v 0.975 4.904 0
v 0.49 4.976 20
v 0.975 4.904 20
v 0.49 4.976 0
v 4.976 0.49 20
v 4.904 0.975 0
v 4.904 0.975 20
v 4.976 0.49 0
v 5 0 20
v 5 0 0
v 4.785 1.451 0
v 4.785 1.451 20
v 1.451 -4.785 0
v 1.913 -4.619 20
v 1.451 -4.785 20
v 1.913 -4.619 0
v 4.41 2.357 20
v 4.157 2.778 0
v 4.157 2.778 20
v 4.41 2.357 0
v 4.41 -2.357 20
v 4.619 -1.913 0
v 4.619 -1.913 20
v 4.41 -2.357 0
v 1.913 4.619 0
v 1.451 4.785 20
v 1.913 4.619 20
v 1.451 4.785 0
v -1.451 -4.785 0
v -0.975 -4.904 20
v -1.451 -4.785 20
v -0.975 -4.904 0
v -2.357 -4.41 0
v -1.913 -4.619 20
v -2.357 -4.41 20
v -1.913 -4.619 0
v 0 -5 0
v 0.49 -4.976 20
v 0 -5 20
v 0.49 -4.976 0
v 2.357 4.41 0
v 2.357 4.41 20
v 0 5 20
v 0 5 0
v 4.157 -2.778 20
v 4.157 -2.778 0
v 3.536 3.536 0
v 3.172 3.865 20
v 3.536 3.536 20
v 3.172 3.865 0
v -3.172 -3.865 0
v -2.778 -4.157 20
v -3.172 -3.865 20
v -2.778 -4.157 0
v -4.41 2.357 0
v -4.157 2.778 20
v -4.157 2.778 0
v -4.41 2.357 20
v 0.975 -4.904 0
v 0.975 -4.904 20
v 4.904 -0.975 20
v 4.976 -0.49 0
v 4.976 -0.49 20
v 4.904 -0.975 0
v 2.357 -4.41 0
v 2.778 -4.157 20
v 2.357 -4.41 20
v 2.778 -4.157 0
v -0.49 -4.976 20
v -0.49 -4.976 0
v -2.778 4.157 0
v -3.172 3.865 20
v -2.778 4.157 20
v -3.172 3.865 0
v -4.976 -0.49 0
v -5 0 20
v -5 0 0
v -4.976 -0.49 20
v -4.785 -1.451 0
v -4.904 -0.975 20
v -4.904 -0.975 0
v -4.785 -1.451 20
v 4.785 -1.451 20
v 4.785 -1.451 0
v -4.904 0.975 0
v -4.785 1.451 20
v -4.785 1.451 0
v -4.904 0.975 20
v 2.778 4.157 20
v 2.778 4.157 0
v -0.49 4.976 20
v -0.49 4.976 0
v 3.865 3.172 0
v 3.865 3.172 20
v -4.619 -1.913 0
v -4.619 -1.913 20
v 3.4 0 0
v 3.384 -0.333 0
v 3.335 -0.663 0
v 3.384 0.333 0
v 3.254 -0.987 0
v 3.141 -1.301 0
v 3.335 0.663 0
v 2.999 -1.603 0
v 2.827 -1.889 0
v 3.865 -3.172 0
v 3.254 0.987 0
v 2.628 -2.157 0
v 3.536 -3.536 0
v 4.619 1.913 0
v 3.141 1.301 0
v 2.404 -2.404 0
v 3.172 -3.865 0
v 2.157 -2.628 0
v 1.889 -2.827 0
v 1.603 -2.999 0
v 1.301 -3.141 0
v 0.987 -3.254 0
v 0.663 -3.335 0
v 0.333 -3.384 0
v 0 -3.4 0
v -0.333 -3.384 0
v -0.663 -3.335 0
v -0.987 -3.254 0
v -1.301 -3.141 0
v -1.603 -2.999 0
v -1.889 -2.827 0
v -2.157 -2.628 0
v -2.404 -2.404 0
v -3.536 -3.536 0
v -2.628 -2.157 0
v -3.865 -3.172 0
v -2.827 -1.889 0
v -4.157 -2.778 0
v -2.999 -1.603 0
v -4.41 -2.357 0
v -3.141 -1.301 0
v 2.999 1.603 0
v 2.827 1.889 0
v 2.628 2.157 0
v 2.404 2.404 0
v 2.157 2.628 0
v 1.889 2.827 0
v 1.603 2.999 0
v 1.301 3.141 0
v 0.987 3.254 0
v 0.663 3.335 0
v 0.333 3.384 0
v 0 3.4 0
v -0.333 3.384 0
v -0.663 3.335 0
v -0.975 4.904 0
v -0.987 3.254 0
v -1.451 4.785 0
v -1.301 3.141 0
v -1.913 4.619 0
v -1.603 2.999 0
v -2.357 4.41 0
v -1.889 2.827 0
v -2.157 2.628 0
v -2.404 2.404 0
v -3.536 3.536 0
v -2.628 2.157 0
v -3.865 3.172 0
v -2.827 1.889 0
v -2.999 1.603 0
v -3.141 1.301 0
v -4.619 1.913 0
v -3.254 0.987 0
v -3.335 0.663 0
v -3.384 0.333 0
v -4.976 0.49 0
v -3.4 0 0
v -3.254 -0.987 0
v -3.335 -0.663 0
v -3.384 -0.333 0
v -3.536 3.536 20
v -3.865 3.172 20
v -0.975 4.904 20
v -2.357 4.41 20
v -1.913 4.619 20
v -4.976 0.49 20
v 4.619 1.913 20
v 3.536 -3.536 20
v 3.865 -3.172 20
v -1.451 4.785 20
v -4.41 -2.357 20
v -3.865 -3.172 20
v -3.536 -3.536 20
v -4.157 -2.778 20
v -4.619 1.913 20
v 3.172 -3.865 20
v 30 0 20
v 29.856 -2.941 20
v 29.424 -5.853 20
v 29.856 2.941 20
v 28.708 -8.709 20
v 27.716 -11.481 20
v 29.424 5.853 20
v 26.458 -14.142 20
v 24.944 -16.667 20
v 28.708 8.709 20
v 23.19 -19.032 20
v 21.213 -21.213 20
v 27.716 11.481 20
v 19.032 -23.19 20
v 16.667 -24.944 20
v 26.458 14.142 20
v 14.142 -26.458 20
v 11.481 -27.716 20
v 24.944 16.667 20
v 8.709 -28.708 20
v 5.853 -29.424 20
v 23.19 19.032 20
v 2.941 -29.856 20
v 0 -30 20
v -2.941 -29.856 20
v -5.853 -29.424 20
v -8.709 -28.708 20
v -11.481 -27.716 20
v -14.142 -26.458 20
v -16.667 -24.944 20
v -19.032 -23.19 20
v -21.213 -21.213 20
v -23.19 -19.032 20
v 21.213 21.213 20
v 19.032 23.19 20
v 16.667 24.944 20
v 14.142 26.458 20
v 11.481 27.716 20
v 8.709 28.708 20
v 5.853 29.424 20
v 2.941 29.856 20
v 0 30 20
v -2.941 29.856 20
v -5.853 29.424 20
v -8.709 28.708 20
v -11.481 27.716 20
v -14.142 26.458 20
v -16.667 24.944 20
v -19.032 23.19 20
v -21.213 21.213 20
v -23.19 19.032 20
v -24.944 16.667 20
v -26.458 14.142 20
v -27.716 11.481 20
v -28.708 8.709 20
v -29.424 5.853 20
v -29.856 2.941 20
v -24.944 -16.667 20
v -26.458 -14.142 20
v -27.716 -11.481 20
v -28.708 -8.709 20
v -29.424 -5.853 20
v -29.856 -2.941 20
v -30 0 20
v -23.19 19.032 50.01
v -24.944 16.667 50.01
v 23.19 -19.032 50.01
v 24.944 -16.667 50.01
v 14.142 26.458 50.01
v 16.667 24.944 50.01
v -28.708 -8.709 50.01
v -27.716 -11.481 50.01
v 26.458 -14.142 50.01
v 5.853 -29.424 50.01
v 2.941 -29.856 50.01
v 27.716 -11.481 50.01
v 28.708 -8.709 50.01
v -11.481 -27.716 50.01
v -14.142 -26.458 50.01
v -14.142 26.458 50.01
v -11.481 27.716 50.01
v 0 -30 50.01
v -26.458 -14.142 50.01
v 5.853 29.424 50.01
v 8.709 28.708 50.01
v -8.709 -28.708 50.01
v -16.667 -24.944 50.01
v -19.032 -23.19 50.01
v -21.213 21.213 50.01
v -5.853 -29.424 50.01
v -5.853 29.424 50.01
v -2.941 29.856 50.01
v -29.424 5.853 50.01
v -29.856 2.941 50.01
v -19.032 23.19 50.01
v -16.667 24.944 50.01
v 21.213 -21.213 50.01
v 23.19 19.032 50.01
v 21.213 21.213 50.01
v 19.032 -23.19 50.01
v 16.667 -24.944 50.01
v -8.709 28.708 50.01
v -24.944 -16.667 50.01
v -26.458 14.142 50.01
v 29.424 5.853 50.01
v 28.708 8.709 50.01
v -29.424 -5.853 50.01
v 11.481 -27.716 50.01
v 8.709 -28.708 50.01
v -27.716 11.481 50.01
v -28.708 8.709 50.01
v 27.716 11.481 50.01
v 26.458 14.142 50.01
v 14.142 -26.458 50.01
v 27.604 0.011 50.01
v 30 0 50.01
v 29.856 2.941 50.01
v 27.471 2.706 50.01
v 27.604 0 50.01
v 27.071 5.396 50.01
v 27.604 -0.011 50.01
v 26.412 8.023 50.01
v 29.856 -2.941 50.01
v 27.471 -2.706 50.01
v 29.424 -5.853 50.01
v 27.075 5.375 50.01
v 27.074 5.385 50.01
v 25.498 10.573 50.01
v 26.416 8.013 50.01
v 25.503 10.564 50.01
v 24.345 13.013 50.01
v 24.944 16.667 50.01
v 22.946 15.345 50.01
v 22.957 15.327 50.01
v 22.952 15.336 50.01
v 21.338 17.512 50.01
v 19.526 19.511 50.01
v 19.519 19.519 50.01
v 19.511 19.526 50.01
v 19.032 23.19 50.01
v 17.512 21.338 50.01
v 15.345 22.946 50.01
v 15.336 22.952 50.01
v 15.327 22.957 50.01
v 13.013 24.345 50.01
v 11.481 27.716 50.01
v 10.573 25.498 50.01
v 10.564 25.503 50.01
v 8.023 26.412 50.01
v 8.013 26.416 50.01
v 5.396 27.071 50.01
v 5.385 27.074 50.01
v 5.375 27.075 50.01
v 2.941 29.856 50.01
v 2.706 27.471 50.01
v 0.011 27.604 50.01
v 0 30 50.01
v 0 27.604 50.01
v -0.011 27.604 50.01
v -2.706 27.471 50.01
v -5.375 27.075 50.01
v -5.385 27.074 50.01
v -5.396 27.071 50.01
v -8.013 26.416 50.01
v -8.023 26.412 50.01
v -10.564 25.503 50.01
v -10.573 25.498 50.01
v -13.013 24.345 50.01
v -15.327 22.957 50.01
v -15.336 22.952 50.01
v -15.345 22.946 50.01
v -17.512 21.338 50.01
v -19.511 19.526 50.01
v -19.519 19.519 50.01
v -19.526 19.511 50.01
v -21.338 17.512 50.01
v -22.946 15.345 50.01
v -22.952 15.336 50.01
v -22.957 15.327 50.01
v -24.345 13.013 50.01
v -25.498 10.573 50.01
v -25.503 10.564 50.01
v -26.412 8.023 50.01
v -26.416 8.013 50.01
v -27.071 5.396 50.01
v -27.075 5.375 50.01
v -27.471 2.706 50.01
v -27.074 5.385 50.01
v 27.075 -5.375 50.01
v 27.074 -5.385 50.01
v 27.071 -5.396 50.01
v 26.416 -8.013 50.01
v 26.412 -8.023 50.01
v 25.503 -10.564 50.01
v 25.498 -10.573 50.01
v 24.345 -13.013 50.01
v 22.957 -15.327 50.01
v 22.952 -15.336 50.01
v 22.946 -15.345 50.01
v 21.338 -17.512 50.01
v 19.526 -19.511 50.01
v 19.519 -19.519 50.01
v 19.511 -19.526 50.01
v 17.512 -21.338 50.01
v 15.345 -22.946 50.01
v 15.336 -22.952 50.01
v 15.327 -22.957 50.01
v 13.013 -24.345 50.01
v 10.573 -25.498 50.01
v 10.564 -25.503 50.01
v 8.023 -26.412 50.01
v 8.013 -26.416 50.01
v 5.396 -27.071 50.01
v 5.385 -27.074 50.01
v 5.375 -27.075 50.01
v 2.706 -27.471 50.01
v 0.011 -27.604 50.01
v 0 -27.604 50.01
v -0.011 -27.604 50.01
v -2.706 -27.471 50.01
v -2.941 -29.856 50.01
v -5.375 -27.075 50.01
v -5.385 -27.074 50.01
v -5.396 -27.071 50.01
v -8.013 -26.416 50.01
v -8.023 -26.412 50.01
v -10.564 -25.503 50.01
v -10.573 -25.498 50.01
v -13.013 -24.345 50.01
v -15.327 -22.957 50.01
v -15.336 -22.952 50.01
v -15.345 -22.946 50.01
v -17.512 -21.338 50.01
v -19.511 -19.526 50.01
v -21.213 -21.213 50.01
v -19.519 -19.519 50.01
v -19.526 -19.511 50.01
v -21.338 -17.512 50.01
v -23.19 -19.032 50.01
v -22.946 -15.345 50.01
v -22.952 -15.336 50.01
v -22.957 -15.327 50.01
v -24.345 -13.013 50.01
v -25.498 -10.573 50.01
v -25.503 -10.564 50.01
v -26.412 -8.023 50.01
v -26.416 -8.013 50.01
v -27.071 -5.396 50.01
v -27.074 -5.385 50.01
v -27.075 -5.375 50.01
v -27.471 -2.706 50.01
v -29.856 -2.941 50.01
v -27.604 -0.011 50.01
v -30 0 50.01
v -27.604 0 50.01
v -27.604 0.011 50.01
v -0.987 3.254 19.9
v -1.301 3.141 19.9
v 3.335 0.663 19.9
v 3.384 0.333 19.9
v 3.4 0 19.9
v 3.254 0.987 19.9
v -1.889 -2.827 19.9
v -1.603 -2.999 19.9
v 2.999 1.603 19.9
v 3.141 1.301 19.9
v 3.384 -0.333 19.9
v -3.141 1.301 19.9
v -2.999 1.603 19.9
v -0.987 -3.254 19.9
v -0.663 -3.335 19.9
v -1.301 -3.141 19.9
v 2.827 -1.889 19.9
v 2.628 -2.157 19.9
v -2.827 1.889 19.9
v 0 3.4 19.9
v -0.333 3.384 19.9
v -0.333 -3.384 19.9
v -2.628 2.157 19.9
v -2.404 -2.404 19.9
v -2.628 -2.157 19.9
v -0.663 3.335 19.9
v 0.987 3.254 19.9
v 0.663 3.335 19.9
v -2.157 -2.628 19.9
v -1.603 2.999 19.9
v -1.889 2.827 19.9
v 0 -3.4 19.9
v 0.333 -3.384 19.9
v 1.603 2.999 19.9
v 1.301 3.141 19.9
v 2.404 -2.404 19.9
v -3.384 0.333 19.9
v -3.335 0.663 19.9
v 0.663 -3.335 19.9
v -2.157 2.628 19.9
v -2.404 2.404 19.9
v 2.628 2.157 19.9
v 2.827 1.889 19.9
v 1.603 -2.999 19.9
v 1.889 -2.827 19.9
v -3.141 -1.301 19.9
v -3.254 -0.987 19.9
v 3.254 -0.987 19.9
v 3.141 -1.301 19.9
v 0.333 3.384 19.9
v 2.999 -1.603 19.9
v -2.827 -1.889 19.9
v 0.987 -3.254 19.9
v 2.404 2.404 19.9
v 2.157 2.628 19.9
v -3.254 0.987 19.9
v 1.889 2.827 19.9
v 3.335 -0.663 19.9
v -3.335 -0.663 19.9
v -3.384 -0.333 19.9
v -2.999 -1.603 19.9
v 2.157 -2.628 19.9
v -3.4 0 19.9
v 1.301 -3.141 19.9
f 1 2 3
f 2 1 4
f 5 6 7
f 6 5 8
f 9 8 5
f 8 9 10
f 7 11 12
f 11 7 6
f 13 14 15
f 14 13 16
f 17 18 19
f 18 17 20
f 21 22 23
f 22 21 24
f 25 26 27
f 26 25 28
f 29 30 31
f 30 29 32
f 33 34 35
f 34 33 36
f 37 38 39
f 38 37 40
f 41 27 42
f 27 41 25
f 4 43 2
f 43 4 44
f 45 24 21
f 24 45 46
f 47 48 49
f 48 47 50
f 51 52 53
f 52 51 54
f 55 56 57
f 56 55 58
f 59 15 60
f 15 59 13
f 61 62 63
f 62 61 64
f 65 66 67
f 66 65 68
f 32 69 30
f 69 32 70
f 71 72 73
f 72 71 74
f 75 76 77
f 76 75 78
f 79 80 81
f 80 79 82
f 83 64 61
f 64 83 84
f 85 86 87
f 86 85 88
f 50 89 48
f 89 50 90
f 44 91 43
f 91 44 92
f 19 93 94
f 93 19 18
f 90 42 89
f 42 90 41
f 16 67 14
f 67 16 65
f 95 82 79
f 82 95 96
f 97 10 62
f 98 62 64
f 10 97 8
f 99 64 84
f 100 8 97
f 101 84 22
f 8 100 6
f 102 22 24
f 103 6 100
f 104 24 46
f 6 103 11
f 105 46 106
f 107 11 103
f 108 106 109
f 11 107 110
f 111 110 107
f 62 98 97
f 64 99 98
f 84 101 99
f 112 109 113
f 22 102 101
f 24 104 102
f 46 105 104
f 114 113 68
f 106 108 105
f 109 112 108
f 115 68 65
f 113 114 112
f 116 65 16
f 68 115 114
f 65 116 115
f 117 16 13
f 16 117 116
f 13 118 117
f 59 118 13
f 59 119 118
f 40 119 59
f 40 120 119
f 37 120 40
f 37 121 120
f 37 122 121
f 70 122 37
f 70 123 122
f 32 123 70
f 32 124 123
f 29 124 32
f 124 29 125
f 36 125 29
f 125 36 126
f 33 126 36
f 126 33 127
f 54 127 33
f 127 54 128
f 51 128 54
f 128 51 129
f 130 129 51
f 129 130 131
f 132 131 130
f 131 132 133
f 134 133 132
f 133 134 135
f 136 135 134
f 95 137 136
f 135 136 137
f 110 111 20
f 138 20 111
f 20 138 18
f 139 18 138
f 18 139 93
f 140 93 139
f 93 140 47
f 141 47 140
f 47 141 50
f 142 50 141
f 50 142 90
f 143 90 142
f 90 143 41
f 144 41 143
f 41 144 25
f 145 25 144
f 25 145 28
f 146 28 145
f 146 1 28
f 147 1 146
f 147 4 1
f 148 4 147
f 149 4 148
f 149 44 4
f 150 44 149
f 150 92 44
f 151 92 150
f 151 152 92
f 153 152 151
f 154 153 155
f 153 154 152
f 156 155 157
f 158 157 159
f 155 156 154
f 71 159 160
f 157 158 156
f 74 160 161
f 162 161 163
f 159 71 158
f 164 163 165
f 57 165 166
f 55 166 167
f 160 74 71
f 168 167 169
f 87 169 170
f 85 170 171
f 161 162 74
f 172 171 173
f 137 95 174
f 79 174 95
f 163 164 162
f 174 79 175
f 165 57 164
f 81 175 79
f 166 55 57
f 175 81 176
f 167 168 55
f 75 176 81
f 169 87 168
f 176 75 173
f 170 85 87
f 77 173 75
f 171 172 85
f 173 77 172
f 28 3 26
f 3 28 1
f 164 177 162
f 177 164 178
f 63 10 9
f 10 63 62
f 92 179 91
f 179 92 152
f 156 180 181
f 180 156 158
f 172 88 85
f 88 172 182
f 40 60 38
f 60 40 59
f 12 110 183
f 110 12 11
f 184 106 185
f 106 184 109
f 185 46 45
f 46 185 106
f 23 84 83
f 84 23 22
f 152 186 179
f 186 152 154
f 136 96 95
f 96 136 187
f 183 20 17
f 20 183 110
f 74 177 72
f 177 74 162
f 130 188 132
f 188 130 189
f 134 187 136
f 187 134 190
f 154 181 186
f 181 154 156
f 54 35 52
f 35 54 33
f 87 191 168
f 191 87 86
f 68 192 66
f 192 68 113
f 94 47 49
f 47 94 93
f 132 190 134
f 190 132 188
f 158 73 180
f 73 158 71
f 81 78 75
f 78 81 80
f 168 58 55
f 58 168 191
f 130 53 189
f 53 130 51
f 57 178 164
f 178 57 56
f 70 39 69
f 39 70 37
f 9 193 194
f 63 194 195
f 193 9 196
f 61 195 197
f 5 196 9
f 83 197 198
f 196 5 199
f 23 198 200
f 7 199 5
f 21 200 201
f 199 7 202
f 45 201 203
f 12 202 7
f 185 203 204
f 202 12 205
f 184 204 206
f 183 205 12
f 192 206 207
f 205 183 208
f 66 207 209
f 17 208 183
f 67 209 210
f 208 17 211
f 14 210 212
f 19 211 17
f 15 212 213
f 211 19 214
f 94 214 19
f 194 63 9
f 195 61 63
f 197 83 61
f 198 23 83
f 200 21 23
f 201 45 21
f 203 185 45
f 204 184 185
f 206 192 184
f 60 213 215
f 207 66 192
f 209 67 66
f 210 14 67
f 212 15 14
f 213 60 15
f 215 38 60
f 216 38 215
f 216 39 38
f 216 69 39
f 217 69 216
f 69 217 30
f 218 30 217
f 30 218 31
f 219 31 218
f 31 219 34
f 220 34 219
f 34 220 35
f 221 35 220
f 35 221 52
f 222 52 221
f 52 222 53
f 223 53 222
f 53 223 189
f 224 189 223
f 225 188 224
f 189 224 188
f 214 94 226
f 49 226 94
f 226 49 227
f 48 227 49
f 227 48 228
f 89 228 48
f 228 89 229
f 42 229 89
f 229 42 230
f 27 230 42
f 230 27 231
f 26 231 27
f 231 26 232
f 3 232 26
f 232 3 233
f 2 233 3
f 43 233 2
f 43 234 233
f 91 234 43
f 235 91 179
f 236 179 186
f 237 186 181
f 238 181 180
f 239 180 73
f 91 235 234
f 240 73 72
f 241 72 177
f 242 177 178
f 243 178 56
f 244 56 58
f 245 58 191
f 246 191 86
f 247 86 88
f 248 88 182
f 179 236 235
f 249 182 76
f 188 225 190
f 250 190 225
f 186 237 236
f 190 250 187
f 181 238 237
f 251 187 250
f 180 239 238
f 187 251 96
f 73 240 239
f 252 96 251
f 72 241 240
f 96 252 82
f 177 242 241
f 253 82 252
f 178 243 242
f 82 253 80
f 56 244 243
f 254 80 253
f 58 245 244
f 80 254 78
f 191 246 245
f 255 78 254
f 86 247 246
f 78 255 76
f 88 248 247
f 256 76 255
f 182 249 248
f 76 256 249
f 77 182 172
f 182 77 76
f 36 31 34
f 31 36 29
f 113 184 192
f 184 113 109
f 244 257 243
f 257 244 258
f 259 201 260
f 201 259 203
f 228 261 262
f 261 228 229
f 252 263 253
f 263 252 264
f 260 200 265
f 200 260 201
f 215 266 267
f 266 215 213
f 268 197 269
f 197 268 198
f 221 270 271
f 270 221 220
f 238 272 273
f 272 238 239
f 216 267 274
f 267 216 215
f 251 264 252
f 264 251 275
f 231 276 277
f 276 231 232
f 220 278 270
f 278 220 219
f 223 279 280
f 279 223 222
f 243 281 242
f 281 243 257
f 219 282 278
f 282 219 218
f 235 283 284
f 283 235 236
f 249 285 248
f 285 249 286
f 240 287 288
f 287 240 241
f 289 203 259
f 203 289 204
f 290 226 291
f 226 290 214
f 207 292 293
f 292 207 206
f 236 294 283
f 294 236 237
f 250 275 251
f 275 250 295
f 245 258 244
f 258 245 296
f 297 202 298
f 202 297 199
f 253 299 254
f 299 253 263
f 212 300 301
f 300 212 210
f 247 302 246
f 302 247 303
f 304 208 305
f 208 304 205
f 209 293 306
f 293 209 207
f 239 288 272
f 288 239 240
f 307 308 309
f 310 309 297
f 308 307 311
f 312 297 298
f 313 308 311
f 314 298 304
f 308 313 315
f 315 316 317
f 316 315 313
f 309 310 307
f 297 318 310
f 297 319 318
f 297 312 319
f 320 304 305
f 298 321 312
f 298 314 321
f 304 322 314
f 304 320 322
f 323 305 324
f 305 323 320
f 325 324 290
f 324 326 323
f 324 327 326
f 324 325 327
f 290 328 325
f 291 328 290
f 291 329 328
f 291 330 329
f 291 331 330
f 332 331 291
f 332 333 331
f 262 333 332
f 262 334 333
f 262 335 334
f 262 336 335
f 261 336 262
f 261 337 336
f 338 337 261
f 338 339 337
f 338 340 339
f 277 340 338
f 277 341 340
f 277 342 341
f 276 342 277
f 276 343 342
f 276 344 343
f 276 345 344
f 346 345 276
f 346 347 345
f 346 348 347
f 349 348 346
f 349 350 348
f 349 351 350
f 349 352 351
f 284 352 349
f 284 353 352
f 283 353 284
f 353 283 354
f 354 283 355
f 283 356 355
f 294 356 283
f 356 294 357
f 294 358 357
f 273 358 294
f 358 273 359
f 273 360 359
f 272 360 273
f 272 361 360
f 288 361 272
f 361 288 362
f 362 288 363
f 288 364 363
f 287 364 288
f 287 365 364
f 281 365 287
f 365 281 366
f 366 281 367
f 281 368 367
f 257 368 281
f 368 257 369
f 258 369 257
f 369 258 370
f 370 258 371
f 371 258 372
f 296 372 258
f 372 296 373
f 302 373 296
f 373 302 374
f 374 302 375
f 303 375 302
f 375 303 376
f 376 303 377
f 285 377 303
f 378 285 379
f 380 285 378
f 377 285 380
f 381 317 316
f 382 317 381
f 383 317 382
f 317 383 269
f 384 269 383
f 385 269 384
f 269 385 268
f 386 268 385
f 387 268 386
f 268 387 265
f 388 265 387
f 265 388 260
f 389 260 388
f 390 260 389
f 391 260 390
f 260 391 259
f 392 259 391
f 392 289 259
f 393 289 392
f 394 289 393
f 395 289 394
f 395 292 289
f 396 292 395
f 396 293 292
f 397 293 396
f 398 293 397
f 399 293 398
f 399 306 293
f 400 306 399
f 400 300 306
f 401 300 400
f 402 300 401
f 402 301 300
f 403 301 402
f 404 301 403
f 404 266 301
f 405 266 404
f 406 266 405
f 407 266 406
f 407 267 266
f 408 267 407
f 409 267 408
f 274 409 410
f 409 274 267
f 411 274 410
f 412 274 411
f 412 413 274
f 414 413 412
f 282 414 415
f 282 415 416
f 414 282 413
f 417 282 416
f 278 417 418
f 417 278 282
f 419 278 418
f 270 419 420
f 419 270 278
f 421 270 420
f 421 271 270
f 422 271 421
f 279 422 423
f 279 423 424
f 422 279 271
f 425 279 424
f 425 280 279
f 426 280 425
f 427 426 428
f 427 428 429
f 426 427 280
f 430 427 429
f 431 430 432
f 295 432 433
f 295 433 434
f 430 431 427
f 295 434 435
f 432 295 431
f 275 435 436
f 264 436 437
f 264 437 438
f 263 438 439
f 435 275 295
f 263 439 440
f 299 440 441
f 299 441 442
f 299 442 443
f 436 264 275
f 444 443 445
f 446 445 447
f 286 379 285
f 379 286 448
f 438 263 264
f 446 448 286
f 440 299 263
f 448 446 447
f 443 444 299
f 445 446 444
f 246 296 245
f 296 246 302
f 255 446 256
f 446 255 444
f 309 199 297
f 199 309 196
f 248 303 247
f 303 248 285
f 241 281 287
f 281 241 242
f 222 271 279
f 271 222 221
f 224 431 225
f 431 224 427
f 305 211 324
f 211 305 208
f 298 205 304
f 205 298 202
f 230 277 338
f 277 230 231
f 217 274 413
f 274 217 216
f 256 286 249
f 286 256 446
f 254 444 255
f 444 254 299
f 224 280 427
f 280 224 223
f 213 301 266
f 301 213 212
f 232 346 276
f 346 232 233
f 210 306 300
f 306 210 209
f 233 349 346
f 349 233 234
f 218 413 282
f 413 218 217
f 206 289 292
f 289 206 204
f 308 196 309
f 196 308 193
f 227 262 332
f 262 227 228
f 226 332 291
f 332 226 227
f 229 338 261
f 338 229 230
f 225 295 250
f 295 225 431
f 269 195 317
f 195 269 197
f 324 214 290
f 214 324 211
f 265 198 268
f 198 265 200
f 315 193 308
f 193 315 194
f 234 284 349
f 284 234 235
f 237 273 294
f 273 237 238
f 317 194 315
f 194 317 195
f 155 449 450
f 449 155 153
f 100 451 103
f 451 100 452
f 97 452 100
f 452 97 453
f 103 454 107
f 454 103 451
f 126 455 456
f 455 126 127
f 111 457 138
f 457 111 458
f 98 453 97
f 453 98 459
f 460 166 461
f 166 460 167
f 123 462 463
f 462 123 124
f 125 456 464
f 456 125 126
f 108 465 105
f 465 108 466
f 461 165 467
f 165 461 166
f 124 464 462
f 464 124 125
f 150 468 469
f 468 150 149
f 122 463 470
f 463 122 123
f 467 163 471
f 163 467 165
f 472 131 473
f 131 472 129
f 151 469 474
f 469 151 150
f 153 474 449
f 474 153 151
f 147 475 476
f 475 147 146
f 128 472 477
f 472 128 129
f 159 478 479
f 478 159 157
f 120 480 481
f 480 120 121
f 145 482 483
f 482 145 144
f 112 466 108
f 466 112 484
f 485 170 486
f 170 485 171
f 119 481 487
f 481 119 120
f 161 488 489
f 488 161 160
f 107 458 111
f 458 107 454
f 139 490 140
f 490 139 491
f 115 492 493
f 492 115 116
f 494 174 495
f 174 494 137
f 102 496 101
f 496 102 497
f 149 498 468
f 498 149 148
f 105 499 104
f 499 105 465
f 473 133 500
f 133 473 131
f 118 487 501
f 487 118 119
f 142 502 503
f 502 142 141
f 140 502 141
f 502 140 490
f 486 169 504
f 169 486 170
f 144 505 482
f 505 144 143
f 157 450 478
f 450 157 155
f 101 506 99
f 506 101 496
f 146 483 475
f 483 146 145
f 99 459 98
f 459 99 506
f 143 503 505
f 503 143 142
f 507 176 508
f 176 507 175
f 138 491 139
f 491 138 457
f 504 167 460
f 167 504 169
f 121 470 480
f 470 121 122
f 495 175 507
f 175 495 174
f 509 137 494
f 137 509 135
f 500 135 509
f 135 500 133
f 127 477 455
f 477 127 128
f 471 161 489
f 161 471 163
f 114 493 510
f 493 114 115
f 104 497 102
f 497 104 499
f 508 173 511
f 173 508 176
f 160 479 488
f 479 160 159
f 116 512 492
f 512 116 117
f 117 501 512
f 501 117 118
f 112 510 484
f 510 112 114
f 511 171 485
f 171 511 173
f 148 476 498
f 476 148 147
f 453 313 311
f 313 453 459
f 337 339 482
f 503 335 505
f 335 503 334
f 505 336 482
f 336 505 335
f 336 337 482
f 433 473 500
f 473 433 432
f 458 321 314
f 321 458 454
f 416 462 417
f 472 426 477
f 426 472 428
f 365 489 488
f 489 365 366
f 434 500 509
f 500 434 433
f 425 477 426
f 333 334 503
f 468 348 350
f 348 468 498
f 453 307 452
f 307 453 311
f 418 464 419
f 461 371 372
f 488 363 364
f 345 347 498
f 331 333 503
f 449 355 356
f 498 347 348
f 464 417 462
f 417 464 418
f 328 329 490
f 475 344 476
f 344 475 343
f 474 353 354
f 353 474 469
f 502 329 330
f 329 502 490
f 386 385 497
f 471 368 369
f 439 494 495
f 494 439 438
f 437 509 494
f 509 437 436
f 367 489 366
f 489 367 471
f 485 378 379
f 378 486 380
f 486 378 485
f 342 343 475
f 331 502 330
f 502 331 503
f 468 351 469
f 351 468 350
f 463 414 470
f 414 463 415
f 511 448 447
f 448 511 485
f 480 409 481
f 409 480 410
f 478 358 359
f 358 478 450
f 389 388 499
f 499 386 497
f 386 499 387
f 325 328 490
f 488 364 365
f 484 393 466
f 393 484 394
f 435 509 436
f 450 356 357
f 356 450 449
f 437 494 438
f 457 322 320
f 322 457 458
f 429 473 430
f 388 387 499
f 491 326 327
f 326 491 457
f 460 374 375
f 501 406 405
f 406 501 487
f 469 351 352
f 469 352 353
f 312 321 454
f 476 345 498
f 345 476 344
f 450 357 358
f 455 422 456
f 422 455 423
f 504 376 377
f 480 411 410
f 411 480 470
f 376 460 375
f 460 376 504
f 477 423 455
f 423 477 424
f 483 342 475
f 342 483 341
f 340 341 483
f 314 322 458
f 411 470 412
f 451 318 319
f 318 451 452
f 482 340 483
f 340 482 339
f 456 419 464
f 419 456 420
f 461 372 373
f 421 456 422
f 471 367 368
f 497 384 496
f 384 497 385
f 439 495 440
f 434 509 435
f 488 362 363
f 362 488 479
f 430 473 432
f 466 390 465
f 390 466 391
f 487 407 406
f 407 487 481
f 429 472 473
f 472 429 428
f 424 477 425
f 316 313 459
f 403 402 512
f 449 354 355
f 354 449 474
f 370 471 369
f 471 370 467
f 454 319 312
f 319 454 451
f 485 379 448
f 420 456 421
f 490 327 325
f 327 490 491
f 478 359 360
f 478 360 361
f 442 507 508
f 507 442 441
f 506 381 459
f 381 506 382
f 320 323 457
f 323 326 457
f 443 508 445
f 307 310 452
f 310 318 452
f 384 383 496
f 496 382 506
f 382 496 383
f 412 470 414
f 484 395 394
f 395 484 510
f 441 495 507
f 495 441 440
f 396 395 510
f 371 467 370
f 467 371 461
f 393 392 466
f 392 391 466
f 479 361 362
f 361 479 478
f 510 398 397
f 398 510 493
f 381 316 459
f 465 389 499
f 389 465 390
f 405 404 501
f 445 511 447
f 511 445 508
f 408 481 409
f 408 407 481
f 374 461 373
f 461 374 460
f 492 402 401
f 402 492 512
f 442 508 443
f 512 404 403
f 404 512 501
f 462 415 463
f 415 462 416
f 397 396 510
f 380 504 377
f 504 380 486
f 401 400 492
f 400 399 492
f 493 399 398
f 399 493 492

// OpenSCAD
// --- Dimensions (mm) ---
spout_od = 10.0;          // Outer diameter of the spout
spout_height = 20.0;      // Height of the spout from the base
funnel_rim_od = 60.0;     // Outer diameter at the top rim
funnel_height = 50.0;     // Total height from base to rim
wall_thickness = 1.6;     // Constant wall thickness

// --- Derived Dimensions ---
spout_id = spout_od - (2 * wall_thickness);
funnel_id_bottom = spout_od - (2 * wall_thickness); // ID at the junction
funnel_id_top = funnel_rim_od - (2 * wall_thickness);

// --- Rendering Settings ---
$fn = 64;

// --- Construction ---

// The part is printed upright, resting on the XY plane at z = 0.
// We use a difference() to create the hollow interior.

difference() {
    // OUTER SHELL
    union() {
        // 1. The Spout (Cylinder)
        cylinder(h = spout_height, d = spout_od);
        
        // 2. The Funnel Cone (Frustum)
        // We use a hull of two cylinders to create the conical shape
        hull() {
            // Bottom of cone (at z = spout_height)
            translate([0, 0, spout_height])
                cylinder(h = 0.01, d = funnel_rim_od);
            
            // Top of cone (at z = funnel_height)
            translate([0, 0, funnel_height])
                cylinder(h = 0.01, d = funnel_rim_od);
            
            // Note: To make it a true cone from spout to rim, 
            // we hull from the spout top to the rim top.
            // However, the prompt specifies the cone widens from 10mm at z=20 to 60mm at z=50.
            // So we hull the cylinder at z=20 and the cylinder at z=50.
            translate([0, 0, spout_height])
                cylinder(h = 0.01, d = spout_od);
            translate([0, 0, funnel_height])
                cylinder(h = 0.01, d = funnel_rim_od);
        }
    }

    // INNER VOID (The "Cutter")
    union() {
        // 1. Spout Bore
        // Extend slightly below z=0 to ensure clean cut
        translate([0, 0, -1])
            cylinder(h = spout_height + 1, d = spout_id);
        
        // 2. Funnel Bore (Conical)
        // We hull the inner diameters to maintain constant wall thickness
        hull() {
            // Bottom of inner cone (at z = spout_height)
            translate([0, 0, spout_height - 0.1])
                cylinder(h = 0.1, d = spout_id);
            
            // Top of inner cone (at z = funnel_height)
            translate([0, 0, funnel_height + 1])
                cylinder(h = 1, d = funnel_id_top);
        }
    }
}

// Note on geometry: 
// The prompt asks for a straight spout from z=0 to z=20.
// Then a cone from z=20 (10mm OD) to z=50 (60mm OD).
// The wall is 1.6mm thick everywhere.
// To achieve this, the outer shape is a cylinder (0-20) + cone (20-50).
// The inner shape is a cylinder (0-20) + cone (20-50).
